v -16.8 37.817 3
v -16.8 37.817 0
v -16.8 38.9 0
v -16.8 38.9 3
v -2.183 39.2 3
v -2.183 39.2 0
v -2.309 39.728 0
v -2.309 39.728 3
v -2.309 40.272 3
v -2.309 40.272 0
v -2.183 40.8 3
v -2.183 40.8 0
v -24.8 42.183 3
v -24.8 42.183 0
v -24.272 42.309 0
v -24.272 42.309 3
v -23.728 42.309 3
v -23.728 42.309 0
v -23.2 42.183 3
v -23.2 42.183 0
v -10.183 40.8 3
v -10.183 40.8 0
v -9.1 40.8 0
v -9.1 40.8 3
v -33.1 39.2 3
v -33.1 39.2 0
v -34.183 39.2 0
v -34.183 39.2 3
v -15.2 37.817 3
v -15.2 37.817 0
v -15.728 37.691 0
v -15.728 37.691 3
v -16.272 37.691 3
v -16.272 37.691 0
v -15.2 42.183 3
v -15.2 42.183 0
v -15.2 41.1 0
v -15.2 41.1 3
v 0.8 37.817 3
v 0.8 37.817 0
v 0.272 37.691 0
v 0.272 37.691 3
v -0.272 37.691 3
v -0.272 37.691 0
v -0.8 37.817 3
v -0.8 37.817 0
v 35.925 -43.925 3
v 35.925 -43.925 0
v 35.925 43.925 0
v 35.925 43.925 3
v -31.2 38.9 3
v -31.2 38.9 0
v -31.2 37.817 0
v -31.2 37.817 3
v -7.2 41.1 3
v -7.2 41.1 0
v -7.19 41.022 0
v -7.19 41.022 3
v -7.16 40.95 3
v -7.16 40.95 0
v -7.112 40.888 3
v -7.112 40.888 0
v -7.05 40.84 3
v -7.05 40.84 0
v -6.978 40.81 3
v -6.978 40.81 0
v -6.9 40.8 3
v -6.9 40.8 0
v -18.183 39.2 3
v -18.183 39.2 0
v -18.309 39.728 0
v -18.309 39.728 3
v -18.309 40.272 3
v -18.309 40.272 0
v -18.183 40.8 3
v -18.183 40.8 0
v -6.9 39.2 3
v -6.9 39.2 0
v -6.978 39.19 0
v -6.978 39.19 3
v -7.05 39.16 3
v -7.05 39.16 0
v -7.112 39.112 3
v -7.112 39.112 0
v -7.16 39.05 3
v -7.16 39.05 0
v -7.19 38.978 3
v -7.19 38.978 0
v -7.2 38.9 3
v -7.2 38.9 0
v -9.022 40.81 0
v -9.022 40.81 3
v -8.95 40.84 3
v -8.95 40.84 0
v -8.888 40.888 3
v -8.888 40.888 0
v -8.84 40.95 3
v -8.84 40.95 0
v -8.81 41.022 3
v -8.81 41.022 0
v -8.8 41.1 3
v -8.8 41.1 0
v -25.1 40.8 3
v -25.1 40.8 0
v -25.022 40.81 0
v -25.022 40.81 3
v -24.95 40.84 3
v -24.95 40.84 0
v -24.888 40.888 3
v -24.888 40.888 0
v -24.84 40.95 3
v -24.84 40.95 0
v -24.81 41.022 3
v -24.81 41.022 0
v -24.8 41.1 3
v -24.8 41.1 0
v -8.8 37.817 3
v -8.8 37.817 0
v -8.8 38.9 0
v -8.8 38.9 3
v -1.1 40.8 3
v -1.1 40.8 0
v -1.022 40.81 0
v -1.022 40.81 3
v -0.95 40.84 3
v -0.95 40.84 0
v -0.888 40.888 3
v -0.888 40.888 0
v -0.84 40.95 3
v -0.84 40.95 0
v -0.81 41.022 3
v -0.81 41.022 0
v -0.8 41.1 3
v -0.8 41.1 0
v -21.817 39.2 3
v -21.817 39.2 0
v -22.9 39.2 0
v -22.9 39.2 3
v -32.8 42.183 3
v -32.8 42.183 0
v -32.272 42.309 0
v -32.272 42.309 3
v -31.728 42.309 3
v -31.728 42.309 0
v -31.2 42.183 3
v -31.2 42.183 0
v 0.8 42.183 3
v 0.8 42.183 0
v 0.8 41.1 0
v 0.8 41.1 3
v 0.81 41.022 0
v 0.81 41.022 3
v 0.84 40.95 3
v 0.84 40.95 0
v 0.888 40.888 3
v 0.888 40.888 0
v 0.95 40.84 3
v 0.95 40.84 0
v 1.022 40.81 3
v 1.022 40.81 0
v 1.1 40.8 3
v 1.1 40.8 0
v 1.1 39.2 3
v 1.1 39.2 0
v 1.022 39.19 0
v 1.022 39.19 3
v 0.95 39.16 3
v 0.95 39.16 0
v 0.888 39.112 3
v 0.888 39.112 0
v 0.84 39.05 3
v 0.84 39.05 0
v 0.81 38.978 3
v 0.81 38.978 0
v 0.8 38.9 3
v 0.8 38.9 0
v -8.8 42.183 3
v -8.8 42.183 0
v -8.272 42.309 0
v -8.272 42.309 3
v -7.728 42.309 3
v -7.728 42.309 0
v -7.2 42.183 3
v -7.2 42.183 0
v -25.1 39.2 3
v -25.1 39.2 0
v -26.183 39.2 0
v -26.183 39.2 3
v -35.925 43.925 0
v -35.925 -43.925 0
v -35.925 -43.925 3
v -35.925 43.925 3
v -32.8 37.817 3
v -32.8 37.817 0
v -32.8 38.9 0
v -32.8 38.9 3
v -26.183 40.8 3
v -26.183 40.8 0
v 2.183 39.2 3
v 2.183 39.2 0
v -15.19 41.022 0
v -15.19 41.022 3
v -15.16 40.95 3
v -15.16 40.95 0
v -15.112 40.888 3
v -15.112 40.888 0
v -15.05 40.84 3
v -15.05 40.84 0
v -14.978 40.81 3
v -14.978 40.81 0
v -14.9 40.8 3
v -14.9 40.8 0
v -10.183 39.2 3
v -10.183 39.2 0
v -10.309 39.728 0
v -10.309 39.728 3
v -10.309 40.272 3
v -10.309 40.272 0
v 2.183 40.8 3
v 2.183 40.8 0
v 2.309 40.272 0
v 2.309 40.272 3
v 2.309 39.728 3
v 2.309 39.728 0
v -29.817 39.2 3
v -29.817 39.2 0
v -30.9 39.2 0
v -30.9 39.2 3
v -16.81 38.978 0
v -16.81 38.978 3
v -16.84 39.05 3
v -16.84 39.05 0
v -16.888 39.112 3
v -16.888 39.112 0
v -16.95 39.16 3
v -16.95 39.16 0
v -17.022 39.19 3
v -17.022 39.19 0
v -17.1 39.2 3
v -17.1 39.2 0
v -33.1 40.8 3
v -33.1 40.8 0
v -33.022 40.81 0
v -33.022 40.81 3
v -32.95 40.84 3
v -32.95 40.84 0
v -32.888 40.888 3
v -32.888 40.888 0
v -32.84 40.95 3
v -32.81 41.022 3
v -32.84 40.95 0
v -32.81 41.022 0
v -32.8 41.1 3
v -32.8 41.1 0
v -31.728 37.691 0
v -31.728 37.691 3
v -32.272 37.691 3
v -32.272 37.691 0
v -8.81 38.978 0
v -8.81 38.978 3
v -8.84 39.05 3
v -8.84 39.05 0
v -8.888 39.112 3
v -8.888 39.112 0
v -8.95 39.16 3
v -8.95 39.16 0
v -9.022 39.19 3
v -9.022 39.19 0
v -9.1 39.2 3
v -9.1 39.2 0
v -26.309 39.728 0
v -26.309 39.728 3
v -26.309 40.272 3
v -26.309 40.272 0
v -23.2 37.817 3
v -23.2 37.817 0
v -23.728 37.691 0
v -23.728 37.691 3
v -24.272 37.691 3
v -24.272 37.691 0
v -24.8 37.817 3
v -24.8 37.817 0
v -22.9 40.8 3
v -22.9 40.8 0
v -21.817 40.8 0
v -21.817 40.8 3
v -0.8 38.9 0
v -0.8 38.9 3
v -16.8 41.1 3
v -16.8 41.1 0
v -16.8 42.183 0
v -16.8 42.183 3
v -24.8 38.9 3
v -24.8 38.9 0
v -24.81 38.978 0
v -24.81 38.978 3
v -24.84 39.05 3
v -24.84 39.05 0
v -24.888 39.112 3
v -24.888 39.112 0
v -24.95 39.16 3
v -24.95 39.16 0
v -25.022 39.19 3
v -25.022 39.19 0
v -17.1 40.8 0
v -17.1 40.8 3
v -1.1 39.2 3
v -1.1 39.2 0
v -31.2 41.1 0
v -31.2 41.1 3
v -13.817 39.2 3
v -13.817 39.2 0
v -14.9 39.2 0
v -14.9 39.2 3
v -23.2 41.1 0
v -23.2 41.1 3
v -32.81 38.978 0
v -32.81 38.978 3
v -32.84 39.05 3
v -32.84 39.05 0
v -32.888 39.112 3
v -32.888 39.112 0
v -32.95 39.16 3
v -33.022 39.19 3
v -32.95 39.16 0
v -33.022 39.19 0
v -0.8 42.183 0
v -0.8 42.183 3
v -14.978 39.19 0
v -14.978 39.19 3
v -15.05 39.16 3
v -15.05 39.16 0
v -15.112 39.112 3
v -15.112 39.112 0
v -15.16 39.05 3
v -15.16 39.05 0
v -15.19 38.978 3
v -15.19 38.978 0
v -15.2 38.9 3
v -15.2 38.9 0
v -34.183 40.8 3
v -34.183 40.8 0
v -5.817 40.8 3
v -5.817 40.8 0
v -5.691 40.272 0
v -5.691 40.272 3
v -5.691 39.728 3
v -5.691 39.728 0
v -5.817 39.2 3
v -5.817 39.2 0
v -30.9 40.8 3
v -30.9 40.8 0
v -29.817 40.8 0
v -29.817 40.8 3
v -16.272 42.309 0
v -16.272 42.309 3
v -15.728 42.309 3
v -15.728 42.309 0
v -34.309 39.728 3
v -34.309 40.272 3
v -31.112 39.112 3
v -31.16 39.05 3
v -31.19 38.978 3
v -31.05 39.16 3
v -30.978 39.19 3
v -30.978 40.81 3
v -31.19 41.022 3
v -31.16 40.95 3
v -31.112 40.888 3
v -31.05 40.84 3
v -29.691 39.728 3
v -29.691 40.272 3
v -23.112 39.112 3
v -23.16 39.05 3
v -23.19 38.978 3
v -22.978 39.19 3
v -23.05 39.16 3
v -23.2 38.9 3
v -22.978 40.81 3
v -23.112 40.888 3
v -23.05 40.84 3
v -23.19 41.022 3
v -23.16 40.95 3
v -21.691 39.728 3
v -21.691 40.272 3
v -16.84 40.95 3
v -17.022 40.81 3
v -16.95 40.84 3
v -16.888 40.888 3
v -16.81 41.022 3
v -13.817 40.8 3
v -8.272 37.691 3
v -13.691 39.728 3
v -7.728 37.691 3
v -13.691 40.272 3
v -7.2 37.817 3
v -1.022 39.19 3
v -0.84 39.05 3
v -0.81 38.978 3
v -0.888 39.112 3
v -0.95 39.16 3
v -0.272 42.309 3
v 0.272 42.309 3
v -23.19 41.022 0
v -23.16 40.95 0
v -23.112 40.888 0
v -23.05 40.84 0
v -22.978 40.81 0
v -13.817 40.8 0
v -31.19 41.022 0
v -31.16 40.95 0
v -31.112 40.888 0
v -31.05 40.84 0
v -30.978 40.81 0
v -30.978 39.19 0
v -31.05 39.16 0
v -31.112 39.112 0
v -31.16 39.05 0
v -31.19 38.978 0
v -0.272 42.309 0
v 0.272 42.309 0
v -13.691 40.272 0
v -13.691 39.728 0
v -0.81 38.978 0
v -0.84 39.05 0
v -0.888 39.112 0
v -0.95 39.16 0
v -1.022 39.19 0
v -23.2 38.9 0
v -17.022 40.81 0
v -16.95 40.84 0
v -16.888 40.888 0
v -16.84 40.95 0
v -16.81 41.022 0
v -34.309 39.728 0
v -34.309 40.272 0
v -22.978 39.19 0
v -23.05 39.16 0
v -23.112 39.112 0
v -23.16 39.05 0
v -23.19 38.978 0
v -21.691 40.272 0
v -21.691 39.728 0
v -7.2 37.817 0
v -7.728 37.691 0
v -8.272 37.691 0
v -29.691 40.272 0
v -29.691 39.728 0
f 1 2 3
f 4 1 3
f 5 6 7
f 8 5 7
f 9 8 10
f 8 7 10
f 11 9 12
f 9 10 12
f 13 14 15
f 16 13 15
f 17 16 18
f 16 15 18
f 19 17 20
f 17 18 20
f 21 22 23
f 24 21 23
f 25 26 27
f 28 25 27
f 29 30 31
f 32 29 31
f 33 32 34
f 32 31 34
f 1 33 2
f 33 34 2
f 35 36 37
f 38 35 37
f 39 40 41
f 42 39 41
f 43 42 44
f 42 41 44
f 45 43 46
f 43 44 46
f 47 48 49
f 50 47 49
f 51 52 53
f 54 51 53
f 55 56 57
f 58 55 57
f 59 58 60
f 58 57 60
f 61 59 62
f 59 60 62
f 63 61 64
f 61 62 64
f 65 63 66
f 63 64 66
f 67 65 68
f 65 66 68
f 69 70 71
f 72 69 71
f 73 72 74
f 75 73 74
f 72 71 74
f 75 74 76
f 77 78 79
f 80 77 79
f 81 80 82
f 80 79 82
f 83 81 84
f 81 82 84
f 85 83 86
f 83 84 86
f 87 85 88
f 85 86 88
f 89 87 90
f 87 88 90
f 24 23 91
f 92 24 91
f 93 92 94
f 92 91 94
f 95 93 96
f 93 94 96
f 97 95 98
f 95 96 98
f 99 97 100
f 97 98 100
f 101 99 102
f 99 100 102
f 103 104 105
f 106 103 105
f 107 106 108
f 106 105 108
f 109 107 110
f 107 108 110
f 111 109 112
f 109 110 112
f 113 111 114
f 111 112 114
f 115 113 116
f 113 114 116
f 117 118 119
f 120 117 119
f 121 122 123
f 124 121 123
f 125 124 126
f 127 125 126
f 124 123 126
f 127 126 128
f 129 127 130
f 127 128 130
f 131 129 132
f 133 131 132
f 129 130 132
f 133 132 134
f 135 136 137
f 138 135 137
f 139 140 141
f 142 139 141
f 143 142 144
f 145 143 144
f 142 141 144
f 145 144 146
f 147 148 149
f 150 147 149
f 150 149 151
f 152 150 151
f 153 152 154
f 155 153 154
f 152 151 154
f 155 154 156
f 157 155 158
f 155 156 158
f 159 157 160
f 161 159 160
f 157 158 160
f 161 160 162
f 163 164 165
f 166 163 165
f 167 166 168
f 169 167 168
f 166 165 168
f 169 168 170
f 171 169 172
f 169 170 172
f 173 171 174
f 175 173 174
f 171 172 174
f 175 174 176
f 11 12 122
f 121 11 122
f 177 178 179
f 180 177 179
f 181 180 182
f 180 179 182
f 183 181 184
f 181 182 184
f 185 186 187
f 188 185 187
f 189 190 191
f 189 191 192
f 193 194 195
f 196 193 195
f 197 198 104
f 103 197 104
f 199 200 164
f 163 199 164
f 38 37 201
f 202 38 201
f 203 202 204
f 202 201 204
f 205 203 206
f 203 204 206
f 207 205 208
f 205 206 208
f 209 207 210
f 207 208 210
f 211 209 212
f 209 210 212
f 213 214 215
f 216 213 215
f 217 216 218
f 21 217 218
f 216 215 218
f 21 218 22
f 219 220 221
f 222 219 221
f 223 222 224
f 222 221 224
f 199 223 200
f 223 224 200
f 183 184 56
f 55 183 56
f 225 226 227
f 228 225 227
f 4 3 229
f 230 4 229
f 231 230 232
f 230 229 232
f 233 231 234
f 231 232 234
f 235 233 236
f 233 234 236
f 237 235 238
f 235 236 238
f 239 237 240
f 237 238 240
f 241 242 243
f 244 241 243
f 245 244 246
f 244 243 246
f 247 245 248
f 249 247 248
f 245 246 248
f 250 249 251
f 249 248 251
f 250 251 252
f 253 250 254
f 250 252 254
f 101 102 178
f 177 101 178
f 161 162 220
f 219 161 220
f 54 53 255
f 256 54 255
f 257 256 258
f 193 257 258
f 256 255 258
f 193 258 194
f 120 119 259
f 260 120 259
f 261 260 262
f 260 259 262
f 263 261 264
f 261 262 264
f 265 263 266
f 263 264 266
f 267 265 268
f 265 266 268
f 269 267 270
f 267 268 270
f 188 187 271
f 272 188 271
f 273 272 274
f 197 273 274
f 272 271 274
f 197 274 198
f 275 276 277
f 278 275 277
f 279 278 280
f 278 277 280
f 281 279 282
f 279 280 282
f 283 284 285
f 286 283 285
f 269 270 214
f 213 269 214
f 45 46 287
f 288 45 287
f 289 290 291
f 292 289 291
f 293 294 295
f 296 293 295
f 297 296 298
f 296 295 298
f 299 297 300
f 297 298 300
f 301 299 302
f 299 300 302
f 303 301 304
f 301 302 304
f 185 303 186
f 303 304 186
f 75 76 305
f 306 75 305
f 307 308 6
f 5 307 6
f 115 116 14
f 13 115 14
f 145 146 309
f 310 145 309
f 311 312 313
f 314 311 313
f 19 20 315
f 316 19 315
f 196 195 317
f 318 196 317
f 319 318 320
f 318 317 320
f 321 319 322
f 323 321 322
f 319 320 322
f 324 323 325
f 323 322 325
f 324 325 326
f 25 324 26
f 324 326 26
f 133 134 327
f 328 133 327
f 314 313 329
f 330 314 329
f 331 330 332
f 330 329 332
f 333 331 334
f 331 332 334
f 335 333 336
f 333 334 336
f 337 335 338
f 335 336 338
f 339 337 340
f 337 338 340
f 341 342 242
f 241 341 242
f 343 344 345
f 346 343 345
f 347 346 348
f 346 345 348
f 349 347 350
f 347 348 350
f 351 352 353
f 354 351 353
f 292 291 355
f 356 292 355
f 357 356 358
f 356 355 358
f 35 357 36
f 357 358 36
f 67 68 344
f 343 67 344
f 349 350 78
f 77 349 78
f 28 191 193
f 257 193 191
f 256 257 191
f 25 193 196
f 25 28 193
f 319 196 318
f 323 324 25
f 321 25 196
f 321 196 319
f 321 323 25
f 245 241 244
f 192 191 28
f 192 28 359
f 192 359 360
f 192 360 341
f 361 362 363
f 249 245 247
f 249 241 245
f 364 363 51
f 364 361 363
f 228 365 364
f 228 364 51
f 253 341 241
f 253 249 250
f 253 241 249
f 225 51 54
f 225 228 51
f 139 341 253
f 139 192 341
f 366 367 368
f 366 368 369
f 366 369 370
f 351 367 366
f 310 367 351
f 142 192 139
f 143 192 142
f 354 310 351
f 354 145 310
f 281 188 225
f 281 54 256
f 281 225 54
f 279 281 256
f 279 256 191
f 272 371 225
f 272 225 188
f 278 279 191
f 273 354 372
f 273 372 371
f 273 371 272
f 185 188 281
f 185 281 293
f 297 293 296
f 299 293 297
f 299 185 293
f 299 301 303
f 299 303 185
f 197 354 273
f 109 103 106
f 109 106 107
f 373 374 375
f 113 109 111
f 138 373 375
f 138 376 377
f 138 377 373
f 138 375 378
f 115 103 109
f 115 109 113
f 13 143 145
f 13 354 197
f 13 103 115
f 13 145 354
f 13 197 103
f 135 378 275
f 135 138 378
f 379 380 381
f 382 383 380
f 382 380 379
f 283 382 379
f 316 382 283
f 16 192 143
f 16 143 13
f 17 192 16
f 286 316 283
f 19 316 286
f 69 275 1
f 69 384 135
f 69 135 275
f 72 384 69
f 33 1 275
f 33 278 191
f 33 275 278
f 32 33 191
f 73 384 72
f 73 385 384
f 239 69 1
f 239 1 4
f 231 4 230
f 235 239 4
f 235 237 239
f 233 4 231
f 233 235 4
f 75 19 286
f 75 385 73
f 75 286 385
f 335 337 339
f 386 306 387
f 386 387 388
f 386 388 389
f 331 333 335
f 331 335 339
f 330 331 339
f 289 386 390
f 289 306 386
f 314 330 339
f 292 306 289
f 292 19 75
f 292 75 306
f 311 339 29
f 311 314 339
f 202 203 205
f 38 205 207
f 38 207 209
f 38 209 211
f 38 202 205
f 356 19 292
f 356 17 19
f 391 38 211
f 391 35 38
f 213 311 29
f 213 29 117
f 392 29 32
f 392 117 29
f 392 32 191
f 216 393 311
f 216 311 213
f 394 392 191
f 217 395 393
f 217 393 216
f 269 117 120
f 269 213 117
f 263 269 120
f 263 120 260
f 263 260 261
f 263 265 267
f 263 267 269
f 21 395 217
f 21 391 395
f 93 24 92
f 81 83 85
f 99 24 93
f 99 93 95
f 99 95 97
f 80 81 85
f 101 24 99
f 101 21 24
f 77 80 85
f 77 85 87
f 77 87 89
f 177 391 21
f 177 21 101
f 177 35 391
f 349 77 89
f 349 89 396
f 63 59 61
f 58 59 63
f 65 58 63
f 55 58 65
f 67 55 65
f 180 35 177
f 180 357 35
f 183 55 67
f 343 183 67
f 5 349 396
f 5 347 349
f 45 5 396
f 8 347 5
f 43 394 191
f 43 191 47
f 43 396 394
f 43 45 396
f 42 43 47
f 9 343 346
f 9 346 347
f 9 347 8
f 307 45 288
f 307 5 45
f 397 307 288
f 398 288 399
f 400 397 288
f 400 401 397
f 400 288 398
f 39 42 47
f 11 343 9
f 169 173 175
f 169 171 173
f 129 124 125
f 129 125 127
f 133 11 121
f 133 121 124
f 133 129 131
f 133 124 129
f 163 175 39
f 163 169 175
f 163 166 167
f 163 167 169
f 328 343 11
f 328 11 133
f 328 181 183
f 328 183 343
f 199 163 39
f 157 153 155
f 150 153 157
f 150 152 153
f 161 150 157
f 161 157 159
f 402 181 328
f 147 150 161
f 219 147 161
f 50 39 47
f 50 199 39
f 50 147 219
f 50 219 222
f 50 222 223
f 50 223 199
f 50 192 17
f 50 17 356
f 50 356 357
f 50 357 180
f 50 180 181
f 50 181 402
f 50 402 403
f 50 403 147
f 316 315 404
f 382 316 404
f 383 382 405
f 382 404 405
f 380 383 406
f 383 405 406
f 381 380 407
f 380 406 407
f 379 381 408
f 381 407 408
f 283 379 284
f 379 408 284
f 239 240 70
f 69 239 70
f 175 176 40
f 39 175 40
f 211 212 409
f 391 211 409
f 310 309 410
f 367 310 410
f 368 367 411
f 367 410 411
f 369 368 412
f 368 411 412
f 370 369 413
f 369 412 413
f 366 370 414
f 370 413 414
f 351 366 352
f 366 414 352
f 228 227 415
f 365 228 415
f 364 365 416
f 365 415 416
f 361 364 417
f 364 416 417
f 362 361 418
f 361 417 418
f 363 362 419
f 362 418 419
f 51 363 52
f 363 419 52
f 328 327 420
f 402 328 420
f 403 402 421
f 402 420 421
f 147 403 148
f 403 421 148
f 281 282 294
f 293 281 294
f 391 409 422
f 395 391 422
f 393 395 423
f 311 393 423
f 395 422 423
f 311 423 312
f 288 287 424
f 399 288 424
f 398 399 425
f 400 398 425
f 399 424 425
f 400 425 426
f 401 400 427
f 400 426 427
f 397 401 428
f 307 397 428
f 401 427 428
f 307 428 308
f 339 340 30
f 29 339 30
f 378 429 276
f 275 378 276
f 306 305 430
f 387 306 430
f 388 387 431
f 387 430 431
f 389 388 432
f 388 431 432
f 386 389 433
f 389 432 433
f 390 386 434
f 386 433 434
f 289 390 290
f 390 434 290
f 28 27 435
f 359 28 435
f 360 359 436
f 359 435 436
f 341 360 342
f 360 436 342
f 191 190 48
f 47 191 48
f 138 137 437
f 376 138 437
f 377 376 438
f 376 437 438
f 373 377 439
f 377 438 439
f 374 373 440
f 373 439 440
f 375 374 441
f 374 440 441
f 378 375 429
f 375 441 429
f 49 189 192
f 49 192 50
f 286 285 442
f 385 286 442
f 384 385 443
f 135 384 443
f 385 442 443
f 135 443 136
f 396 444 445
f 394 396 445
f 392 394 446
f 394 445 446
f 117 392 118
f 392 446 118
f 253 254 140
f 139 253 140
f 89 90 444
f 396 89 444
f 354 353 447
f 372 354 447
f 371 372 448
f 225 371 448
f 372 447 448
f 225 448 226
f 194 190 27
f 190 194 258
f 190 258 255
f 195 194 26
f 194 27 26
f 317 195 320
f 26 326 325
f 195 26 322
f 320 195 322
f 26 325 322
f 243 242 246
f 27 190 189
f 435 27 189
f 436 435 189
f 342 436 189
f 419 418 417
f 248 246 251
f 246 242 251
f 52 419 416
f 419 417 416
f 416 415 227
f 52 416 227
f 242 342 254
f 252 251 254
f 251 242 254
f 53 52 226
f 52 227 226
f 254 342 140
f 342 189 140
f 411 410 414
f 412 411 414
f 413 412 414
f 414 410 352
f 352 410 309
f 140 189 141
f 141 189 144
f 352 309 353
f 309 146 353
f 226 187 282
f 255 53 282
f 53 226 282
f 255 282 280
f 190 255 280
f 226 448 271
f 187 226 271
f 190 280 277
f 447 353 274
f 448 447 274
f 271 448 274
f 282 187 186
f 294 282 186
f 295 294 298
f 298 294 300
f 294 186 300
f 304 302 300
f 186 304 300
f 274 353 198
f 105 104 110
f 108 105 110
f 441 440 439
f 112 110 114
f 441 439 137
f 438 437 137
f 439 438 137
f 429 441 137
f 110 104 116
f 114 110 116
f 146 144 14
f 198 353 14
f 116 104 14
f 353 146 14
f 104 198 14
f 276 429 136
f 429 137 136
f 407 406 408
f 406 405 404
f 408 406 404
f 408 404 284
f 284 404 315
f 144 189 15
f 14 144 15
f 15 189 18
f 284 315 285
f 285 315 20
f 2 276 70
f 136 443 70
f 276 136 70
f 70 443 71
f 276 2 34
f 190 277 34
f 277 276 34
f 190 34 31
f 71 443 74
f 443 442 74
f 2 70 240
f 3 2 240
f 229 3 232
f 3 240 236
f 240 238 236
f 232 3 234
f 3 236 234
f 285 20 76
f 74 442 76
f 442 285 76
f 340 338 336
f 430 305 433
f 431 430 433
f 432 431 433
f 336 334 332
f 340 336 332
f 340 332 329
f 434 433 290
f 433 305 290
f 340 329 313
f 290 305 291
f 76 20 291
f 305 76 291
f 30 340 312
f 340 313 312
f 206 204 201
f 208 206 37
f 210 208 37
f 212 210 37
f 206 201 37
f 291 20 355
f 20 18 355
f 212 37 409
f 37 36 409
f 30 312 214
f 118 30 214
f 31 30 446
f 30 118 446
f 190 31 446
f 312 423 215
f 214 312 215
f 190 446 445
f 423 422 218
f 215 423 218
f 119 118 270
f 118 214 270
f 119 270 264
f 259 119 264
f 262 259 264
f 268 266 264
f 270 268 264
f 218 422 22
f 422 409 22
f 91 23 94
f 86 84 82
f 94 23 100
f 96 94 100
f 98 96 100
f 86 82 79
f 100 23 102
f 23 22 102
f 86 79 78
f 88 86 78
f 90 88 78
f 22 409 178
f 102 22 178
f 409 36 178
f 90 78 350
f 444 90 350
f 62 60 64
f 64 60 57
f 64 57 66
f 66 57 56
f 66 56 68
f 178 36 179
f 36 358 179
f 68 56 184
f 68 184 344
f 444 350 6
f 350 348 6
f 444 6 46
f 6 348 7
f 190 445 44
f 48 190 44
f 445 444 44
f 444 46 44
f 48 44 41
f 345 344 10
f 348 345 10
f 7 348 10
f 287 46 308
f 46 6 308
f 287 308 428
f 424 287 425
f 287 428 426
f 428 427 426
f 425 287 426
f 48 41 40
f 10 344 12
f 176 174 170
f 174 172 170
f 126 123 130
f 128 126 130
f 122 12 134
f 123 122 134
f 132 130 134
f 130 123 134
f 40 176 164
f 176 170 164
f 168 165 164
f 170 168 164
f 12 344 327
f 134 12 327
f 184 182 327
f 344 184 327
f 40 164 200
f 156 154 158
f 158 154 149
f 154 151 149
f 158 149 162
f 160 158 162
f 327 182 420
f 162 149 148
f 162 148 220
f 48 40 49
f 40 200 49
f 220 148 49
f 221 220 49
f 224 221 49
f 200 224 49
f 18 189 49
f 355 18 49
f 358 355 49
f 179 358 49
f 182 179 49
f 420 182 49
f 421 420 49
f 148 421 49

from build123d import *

# Parameters (mm, degrees)
F0_W     = 71.85
F0_H     = 87.85
F1_DEPTH = 3


with BuildPart() as f1:
    # F0 (on Top) → F1 (new body)
    with BuildSketch(Plane.XY):
        Rectangle(F0_W, F0_H)
        with BuildLine():
            ThreePointArc((-32.8, 42.183031), (-32, 42.325), (-31.2, 42.183031))
            Line((-31.2, 42.183031), (-31.2, 41.1))
            ThreePointArc((-31.2, 41.1), (-31.112132, 40.887868), (-30.9, 40.8))
            Line((-30.9, 40.8), (-29.816969, 40.8))
            ThreePointArc((-29.816969, 40.8), (-29.675, 40), (-29.816969, 39.2))
            Line((-29.816969, 39.2), (-30.9, 39.2))
            ThreePointArc((-30.9, 39.2), (-31.112132, 39.112132), (-31.2, 38.9))
            Line((-31.2, 38.9), (-31.2, 37.816969))
            ThreePointArc((-31.2, 37.816969), (-32, 37.675), (-32.8, 37.816969))
            Line((-32.8, 37.816969), (-32.8, 38.9))
            ThreePointArc((-32.8, 38.9), (-32.887868, 39.112132), (-33.1, 39.2))
            Line((-33.1, 39.2), (-34.183031, 39.2))
            ThreePointArc((-34.183031, 39.2), (-34.325, 40), (-34.183031, 40.8))
            Line((-34.183031, 40.8), (-33.1, 40.8))
            ThreePointArc((-33.1, 40.8), (-32.887868, 40.887868), (-32.8, 41.1))
            Line((-32.8, 41.1), (-32.8, 42.183031))
        make_face(mode=Mode.SUBTRACT)
        with BuildLine():
            ThreePointArc((-24.8, 42.183031), (-24, 42.325), (-23.2, 42.183031))
            Line((-23.2, 42.183031), (-23.2, 41.1))
            ThreePointArc((-23.2, 41.1), (-23.112132, 40.887868), (-22.9, 40.8))
            Line((-22.9, 40.8), (-21.816969, 40.8))
            ThreePointArc((-21.816969, 40.8), (-21.675, 40), (-21.816969, 39.2))
            Line((-21.816969, 39.2), (-22.9, 39.2))
            ThreePointArc((-22.9, 39.2), (-23.112132, 39.112132), (-23.2, 38.9))
            Line((-23.2, 38.9), (-23.2, 37.816969))
            ThreePointArc((-23.2, 37.816969), (-24, 37.675), (-24.8, 37.816969))
            Line((-24.8, 37.816969), (-24.8, 38.9))
            ThreePointArc((-24.8, 38.9), (-24.887868, 39.112132), (-25.1, 39.2))
            Line((-25.1, 39.2), (-26.183031, 39.2))
            ThreePointArc((-26.183031, 39.2), (-26.325, 40), (-26.183031, 40.8))
            Line((-26.183031, 40.8), (-25.1, 40.8))
            ThreePointArc((-25.1, 40.8), (-24.887868, 40.887868), (-24.8, 41.1))
            Line((-24.8, 41.1), (-24.8, 42.183031))
        make_face(mode=Mode.SUBTRACT)
        with BuildLine():
            ThreePointArc((-16.8, 42.183031), (-16, 42.325), (-15.2, 42.183031))
            Line((-15.2, 42.183031), (-15.2, 41.1))
            ThreePointArc((-15.2, 41.1), (-15.112132, 40.887868), (-14.9, 40.8))
            Line((-14.9, 40.8), (-13.816969, 40.8))
            ThreePointArc((-13.816969, 40.8), (-13.675, 40), (-13.816969, 39.2))
            Line((-13.816969, 39.2), (-14.9, 39.2))
            ThreePointArc((-14.9, 39.2), (-15.112132, 39.112132), (-15.2, 38.9))
            Line((-15.2, 38.9), (-15.2, 37.816969))
            ThreePointArc((-15.2, 37.816969), (-16, 37.675), (-16.8, 37.816969))
            Line((-16.8, 37.816969), (-16.8, 38.9))
            ThreePointArc((-16.8, 38.9), (-16.887868, 39.112132), (-17.1, 39.2))
            Line((-17.1, 39.2), (-18.183031, 39.2))
            ThreePointArc((-18.183031, 39.2), (-18.325, 40), (-18.183031, 40.8))
            Line((-18.183031, 40.8), (-17.1, 40.8))
            ThreePointArc((-17.1, 40.8), (-16.887868, 40.887868), (-16.8, 41.1))
            Line((-16.8, 41.1), (-16.8, 42.183031))
        make_face(mode=Mode.SUBTRACT)
        with BuildLine():
            ThreePointArc((-8.8, 42.183031), (-8, 42.325), (-7.2, 42.183031))
            Line((-7.2, 42.183031), (-7.2, 41.1))
            ThreePointArc((-7.2, 41.1), (-7.112132, 40.887868), (-6.9, 40.8))
            Line((-6.9, 40.8), (-5.816969, 40.8))
            ThreePointArc((-5.816969, 40.8), (-5.675, 40), (-5.816969, 39.2))
            Line((-5.816969, 39.2), (-6.9, 39.2))
            ThreePointArc((-6.9, 39.2), (-7.112132, 39.112132), (-7.2, 38.9))
            Line((-7.2, 38.9), (-7.2, 37.816969))
            ThreePointArc((-7.2, 37.816969), (-8, 37.675), (-8.8, 37.816969))
            Line((-8.8, 37.816969), (-8.8, 38.9))
            ThreePointArc((-8.8, 38.9), (-8.887868, 39.112132), (-9.1, 39.2))
            Line((-9.1, 39.2), (-10.183031, 39.2))
            ThreePointArc((-10.183031, 39.2), (-10.325, 40), (-10.183031, 40.8))
            Line((-10.183031, 40.8), (-9.1, 40.8))
            ThreePointArc((-9.1, 40.8), (-8.887868, 40.887868), (-8.8, 41.1))
            Line((-8.8, 41.1), (-8.8, 42.183031))
        make_face(mode=Mode.SUBTRACT)
        with BuildLine():
            ThreePointArc((-0.8, 42.183031), (0, 42.325), (0.8, 42.183031))
            Line((0.8, 42.183031), (0.8, 41.1))
            ThreePointArc((0.8, 41.1), (0.887868, 40.887868), (1.1, 40.8))
            Line((1.1, 40.8), (2.183031, 40.8))
            ThreePointArc((2.183031, 40.8), (2.325, 40), (2.183031, 39.2))
            Line((2.183031, 39.2), (1.1, 39.2))
            ThreePointArc((1.1, 39.2), (0.887868, 39.112132), (0.8, 38.9))
            Line((0.8, 38.9), (0.8, 37.816969))
            ThreePointArc((0.8, 37.816969), (0, 37.675), (-0.8, 37.816969))
            Line((-0.8, 37.816969), (-0.8, 38.9))
            ThreePointArc((-0.8, 38.9), (-0.887868, 39.112132), (-1.1, 39.2))
            Line((-1.1, 39.2), (-2.183031, 39.2))
            ThreePointArc((-2.183031, 39.2), (-2.325, 40), (-2.183031, 40.8))
            Line((-2.183031, 40.8), (-1.1, 40.8))
            ThreePointArc((-1.1, 40.8), (-0.887868, 40.887868), (-0.8, 41.1))
            Line((-0.8, 41.1), (-0.8, 42.183031))
        make_face(mode=Mode.SUBTRACT)
    extrude(amount=F1_DEPTH)


solid = f1.part
